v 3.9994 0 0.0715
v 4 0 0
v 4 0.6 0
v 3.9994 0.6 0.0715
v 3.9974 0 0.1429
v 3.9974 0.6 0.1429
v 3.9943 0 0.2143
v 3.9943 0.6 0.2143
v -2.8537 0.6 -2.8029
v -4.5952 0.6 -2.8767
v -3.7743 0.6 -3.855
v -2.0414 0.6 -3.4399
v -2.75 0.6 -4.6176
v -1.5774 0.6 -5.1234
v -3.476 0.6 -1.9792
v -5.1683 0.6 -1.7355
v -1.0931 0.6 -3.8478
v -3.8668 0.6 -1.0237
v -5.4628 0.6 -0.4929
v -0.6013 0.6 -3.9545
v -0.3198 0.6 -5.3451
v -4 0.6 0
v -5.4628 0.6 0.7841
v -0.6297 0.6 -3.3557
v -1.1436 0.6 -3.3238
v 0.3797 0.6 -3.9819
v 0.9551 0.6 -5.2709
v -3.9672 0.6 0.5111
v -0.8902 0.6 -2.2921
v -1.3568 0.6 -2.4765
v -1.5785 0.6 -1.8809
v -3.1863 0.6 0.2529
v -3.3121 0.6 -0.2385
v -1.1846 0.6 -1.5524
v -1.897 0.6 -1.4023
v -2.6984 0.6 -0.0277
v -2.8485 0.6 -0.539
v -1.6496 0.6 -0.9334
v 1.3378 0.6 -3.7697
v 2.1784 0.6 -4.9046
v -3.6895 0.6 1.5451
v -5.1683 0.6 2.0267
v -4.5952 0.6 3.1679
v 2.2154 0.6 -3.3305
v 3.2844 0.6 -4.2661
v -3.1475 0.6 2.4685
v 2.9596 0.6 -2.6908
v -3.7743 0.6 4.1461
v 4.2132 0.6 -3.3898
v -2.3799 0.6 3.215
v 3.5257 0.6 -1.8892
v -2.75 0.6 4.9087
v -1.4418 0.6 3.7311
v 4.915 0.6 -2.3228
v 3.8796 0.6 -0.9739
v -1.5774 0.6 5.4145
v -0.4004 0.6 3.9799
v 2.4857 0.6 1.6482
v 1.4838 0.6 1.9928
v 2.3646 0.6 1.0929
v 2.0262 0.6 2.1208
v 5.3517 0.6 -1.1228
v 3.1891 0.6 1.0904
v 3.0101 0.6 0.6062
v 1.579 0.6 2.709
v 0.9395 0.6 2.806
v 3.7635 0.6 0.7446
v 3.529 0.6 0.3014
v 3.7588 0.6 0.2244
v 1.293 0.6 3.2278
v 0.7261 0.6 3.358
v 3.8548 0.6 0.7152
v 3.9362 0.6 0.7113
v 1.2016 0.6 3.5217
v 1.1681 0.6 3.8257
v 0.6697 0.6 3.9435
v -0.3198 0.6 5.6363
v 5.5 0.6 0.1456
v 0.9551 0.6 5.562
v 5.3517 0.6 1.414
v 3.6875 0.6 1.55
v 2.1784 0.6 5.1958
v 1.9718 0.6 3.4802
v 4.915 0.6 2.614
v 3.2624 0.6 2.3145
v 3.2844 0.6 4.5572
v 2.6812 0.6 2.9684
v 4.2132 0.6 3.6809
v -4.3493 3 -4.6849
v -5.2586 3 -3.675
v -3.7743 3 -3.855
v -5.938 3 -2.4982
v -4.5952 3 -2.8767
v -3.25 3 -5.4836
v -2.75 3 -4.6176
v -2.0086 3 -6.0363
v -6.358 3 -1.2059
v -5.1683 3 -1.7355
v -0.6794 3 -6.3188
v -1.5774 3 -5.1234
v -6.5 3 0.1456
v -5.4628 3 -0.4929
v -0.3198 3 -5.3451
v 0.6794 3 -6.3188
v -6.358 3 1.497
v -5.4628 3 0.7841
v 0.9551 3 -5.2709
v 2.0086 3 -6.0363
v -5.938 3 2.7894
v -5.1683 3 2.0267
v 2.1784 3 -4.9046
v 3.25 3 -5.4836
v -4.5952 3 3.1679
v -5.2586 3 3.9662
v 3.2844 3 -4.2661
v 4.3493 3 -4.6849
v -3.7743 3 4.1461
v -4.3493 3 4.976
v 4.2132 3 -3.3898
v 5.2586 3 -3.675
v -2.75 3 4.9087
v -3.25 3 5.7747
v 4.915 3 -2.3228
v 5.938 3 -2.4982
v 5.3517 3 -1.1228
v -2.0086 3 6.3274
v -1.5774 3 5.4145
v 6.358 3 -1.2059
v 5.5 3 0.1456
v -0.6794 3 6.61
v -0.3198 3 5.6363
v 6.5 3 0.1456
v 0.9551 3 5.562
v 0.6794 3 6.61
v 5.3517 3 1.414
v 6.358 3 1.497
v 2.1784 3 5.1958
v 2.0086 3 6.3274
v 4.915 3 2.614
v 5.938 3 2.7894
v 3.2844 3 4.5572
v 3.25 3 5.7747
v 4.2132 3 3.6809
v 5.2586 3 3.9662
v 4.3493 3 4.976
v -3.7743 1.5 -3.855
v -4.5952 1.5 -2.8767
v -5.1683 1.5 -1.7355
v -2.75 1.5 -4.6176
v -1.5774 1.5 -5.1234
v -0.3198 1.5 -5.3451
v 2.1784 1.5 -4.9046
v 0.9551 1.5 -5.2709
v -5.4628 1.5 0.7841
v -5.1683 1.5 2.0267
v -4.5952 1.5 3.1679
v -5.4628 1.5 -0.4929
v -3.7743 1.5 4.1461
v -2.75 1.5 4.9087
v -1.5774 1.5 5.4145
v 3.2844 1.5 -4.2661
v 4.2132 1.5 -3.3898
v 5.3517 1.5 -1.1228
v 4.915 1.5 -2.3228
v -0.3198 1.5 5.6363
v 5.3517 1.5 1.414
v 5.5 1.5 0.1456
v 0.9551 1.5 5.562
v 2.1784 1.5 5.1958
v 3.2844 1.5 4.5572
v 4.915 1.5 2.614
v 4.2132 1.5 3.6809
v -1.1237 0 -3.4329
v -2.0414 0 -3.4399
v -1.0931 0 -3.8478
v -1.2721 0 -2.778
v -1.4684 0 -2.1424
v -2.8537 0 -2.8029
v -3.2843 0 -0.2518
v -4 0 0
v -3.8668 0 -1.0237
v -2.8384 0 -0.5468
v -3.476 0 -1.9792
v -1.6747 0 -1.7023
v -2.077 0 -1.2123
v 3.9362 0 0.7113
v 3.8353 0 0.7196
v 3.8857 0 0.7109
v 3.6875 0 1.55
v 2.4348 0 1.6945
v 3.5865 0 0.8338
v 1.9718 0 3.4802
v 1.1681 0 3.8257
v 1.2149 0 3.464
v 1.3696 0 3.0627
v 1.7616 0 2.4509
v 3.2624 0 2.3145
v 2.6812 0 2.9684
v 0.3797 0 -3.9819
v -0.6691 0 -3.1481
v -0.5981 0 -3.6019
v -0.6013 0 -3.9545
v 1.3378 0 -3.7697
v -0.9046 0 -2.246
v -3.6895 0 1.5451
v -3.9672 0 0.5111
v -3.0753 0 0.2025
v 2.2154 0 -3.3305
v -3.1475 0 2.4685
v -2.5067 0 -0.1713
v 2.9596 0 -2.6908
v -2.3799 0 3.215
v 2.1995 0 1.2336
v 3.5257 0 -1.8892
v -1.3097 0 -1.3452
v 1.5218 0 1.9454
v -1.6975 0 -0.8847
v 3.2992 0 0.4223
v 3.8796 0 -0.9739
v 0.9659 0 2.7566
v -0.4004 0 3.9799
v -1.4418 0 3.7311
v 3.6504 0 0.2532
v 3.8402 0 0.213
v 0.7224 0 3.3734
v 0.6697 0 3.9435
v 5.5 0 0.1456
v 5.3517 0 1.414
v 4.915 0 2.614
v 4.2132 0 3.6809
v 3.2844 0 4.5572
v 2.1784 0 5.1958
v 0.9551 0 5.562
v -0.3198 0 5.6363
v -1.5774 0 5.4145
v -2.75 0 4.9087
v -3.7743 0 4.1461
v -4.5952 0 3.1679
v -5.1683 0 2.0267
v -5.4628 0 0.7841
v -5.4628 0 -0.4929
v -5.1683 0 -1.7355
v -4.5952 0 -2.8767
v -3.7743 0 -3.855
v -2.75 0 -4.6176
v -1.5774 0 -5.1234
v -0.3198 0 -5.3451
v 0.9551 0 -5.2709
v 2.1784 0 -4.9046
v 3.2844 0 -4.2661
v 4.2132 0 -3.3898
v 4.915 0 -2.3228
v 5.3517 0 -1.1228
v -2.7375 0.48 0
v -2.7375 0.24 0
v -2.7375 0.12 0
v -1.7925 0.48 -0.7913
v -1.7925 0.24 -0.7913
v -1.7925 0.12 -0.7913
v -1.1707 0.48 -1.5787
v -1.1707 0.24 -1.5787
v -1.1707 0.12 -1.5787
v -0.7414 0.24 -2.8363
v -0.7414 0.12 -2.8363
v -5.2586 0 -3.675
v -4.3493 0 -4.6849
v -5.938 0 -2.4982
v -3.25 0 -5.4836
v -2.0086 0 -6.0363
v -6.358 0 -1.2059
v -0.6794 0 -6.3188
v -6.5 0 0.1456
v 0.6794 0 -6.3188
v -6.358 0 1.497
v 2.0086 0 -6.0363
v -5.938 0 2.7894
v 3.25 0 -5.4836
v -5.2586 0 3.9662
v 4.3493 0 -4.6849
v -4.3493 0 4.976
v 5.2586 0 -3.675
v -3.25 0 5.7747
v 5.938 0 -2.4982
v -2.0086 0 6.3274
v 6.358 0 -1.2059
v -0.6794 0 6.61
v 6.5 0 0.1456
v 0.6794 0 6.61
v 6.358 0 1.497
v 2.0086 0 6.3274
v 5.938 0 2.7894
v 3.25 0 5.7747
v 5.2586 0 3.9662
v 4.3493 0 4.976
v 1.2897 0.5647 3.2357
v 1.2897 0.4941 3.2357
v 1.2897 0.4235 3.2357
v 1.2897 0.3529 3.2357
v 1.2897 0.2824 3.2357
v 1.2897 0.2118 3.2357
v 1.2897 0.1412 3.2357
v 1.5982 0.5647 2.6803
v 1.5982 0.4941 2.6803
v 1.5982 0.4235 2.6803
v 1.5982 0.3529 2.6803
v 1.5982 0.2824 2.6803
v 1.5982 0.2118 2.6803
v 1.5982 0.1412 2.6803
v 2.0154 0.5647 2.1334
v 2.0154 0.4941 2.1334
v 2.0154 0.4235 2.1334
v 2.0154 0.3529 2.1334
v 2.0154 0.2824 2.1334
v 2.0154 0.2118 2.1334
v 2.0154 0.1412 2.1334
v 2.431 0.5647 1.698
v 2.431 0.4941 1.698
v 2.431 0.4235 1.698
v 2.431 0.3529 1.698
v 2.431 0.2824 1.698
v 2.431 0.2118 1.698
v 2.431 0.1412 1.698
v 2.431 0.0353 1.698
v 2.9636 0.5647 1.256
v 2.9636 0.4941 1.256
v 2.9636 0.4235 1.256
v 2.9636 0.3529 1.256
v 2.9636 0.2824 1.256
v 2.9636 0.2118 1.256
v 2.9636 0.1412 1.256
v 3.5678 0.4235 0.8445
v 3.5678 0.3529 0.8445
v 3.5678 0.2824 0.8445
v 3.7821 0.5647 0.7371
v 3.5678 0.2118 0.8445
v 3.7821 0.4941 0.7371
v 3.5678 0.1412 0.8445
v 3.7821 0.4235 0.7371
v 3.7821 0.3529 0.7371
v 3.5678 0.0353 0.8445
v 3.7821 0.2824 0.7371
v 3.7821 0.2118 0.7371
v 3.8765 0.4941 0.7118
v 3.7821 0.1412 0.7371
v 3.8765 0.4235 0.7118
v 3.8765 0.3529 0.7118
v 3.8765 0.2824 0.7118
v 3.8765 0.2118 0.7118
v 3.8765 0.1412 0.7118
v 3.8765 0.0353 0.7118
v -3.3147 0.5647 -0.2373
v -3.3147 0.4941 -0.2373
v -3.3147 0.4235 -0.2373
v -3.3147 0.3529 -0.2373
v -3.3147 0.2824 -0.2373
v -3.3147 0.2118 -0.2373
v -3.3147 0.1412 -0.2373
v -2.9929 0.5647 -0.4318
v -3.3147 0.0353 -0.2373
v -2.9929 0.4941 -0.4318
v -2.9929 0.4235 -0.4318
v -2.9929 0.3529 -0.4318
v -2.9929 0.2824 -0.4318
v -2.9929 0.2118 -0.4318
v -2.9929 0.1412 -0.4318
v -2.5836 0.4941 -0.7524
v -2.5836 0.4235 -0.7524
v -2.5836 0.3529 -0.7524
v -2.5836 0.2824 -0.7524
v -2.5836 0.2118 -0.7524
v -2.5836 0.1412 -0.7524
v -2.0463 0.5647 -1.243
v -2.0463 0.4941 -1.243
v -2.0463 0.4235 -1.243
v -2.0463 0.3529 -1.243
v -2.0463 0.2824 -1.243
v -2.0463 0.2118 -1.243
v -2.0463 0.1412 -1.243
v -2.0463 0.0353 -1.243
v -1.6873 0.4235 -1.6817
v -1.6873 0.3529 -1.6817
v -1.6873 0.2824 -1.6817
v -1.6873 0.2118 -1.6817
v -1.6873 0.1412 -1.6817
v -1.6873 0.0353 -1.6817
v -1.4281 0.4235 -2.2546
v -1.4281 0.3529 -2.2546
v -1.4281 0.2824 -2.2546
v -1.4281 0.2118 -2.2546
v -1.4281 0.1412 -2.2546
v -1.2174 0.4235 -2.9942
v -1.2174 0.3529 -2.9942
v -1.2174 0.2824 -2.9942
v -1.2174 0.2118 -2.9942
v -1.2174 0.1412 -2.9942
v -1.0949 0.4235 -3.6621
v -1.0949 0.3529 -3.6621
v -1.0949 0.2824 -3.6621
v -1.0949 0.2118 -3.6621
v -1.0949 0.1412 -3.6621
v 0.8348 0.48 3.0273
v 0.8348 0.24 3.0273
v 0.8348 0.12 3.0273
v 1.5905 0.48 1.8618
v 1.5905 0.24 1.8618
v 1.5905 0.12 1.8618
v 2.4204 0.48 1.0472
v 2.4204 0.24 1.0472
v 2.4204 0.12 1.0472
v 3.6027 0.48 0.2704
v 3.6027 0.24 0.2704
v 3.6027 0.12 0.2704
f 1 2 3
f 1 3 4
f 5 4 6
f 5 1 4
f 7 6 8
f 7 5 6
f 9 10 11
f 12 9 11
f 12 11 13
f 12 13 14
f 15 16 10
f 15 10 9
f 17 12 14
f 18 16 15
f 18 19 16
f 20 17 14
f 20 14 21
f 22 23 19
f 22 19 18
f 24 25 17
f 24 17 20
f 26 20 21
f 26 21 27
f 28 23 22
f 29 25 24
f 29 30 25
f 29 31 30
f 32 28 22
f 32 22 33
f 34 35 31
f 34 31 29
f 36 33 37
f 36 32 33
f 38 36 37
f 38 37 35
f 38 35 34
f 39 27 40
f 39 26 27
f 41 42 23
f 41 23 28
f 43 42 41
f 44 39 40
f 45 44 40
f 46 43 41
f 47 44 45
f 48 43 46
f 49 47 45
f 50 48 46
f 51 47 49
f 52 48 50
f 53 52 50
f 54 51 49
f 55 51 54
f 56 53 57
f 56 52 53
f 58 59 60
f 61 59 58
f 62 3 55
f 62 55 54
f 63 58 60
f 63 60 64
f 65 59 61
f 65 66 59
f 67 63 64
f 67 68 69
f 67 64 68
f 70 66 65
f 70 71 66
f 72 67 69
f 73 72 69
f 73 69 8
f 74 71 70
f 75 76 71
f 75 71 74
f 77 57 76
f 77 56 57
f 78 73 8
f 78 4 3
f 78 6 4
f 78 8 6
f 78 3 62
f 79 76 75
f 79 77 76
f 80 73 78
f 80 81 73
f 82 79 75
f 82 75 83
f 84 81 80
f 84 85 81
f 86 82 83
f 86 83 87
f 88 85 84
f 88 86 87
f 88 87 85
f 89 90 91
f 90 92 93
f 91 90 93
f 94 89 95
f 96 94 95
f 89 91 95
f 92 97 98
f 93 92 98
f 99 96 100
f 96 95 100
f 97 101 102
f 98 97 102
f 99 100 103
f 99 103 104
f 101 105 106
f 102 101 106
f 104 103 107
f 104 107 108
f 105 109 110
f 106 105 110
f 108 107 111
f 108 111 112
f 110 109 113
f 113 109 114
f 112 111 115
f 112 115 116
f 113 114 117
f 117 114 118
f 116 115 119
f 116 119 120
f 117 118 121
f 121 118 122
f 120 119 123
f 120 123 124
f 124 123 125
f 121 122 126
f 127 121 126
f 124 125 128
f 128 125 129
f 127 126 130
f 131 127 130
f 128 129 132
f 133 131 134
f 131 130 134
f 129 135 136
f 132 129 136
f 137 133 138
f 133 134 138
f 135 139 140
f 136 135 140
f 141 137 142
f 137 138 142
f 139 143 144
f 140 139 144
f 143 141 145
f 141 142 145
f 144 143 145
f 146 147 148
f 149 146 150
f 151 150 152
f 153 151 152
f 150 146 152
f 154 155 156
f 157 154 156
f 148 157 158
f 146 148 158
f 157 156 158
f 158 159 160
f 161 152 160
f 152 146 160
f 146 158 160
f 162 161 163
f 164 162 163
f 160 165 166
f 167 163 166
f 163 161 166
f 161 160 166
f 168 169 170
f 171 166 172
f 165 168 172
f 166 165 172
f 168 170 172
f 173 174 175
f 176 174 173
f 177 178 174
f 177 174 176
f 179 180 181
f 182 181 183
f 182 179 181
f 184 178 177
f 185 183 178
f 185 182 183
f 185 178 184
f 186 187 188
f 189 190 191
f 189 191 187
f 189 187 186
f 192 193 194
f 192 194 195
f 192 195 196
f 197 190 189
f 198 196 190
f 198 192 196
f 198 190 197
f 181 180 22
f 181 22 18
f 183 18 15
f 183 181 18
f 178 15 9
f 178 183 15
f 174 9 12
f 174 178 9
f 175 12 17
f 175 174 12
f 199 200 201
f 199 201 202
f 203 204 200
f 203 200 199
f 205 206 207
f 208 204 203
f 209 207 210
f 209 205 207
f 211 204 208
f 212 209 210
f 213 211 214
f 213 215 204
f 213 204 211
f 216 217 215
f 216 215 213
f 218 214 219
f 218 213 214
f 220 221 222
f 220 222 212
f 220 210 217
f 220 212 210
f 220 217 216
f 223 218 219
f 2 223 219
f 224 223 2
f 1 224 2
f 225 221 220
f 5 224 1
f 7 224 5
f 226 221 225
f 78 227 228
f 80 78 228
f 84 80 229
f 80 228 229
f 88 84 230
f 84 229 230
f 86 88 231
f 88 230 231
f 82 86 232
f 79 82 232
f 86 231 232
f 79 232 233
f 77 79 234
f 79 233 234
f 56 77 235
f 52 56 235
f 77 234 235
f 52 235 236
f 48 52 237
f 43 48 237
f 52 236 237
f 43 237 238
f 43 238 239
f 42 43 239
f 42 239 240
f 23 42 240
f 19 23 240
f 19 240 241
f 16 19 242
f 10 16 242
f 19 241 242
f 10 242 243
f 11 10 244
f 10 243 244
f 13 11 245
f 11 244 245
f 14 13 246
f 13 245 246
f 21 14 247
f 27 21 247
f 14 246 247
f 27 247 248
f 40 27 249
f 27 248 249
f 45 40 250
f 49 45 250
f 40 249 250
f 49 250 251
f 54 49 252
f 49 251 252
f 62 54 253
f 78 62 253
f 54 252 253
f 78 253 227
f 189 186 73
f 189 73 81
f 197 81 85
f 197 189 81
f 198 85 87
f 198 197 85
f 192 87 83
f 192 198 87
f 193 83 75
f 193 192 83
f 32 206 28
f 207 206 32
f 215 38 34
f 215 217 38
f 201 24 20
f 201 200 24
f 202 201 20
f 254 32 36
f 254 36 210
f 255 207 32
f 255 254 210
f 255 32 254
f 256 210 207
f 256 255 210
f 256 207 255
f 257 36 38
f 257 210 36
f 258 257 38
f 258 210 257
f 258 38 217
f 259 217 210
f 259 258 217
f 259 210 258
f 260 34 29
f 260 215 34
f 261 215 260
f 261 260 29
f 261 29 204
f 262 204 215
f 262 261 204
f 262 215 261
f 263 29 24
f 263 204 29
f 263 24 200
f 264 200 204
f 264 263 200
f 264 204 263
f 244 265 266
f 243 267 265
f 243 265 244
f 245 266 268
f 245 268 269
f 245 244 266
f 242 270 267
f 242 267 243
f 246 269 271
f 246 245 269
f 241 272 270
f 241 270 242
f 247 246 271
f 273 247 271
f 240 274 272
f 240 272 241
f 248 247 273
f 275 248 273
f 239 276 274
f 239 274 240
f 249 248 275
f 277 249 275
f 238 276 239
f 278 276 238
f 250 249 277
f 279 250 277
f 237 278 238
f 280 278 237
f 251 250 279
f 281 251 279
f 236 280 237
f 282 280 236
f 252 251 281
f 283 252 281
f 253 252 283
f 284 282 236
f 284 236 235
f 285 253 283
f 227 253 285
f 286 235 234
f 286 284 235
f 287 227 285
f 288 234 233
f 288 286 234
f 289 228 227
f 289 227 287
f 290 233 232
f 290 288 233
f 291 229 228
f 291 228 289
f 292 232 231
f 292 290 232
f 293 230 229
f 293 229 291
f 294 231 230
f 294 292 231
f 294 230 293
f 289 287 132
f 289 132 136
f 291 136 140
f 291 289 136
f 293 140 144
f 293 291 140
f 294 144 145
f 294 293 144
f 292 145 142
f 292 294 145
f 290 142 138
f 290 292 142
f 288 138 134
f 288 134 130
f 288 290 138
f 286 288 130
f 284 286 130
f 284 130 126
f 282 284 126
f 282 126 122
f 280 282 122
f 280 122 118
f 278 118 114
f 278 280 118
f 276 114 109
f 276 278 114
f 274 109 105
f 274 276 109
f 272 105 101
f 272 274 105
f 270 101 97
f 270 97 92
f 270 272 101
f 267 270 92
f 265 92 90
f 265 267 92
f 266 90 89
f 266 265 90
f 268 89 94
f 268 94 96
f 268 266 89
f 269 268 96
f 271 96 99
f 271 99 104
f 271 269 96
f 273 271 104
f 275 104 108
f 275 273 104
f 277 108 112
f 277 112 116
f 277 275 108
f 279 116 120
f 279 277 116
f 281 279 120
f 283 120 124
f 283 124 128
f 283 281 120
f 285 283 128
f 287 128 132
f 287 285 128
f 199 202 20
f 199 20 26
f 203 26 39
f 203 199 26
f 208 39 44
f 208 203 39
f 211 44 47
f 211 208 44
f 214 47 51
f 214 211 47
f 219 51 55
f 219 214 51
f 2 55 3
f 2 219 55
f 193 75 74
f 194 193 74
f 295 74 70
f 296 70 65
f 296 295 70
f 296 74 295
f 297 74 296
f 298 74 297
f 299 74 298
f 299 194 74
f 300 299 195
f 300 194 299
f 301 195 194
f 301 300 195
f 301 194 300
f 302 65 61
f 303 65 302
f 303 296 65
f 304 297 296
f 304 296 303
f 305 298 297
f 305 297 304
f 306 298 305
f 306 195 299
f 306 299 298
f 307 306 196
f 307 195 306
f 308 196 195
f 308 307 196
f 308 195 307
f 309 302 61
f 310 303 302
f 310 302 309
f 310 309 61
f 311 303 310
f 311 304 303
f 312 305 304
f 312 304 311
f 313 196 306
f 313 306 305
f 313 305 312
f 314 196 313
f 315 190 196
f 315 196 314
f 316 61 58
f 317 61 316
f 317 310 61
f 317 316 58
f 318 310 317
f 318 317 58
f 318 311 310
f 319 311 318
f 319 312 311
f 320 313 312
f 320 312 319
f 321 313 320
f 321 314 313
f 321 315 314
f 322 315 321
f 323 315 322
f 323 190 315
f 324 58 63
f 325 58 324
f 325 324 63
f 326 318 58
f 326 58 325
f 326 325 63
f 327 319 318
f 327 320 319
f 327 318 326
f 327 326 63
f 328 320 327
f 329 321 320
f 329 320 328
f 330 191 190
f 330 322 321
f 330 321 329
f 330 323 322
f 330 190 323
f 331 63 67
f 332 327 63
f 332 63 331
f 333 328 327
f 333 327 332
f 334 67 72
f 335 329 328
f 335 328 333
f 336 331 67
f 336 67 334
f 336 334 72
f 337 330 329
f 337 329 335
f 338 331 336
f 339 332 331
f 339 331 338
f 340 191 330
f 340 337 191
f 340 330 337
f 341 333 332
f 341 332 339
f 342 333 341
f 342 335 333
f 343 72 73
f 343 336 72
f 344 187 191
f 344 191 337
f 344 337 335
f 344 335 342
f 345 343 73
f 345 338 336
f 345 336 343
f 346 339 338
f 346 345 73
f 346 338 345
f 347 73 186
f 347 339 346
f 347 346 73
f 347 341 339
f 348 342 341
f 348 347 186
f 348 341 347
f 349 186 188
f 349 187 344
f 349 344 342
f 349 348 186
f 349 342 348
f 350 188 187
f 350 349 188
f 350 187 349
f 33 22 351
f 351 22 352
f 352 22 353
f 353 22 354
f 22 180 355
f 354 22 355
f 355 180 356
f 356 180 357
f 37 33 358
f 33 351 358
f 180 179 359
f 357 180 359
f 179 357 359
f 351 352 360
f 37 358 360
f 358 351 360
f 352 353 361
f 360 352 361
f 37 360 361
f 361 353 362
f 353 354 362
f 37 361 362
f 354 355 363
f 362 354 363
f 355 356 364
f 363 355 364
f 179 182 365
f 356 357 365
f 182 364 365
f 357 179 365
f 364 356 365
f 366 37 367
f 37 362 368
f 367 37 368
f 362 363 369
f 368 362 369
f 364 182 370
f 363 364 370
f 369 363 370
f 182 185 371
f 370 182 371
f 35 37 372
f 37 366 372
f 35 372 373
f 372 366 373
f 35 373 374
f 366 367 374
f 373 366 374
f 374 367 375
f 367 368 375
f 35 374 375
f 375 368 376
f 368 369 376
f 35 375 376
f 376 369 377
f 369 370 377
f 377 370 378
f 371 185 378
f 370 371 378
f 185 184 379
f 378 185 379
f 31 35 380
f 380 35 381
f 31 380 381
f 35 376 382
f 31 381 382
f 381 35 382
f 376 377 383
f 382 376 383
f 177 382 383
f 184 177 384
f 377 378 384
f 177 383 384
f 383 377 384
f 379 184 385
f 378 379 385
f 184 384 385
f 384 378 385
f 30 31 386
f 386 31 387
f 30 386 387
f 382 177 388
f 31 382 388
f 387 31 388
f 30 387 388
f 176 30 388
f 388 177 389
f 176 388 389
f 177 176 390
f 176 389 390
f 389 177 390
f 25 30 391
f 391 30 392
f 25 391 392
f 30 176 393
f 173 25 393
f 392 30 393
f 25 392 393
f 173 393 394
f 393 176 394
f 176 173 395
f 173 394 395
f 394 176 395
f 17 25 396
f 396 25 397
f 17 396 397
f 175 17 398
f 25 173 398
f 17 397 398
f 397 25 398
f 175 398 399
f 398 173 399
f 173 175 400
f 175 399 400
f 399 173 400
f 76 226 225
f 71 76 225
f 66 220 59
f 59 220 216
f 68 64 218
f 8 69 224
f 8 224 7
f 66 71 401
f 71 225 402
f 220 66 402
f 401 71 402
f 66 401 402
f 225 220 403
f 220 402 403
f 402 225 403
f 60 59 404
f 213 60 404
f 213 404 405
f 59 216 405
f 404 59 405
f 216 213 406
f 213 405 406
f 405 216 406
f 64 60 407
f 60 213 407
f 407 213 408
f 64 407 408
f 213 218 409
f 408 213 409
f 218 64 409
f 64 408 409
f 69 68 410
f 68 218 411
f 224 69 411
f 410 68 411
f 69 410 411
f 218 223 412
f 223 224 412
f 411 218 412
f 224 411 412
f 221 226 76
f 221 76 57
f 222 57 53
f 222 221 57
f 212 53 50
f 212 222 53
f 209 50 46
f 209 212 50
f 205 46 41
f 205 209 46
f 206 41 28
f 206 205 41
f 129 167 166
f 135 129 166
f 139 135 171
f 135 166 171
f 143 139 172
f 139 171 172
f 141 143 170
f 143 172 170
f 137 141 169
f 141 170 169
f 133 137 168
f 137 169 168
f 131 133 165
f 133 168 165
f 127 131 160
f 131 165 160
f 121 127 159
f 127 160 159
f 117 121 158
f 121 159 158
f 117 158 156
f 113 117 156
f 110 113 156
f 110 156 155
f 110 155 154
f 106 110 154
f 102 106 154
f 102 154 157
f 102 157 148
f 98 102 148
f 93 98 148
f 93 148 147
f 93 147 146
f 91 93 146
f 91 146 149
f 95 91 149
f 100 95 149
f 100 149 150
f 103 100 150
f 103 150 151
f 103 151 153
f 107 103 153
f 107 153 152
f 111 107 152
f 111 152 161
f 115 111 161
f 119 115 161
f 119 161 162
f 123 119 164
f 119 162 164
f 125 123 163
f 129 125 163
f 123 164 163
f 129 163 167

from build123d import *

# Parameters (mm, degrees)
F1_R     = 6.5
F1_R_2   = 5.5
F3_DEPTH = 3
F4_DEPTH = 1.5
F5_DEPTH = 0.6
F6_DEPTH = 1
F7_DEPTH = 1
F8_DEPTH = 1


# Not quite as in the source:
# - ends of sketch curves that miss each other by under 0.0002 mm in the source are joined
# - the dataset's text gives a spline's control points without its knots; the knots are read off the source's solid


with BuildPart() as f3:
    # F1 (on Front) → F3 (new body)
    with BuildSketch(Plane.XZ):
        with Locations((1.996e-07, 0.145563783)):
            Circle(F1_R)
        with Locations((1.996e-07, 0.145563783)):
            Circle(F1_R_2, mode=Mode.SUBTRACT)
    extrude(amount=-F3_DEPTH)

    # F0 (on Front) + F1 (on Front) → F4 (join)
    with BuildSketch(Plane.XZ):
        with BuildLine():
            add(Edge.make_bspline(
                [(-1.4633628161, -3.8408698747), (-0.8618942381, -4.0797628795), (1.7775925035, -4.2725148883), (2.1266039699, -2.4883414841), (2.1792066492, -0.8570773415), (2.1261946367, 0.7652860278), (1.8591945487, 1.4152828688), (2.1073079889, 1.4090746613), (2.1070261206, 1.5973545621), (1.8482611221, 1.6571502022), (1.9106924097, 2.0013449435), (1.883292753, 2.4559971082), (1.4530608962, 2.5796008165), (1.3486705812, 2.982608362), (0.9522813685, 3.1051443516), (0.6376593936, 3.1670181532), (0.4331394013, 3.4063180529), (0.6426984155, 3.8176132891), (0.3981993423, 4.2634916825), (-0.0062082347, 4.3047771669), (-0.3006353253, 4.2313929361), (-0.6271454426, 3.9609581822), (-0.5601436399, 3.6082200906), (-0.4158755178, 3.3585569408), (-0.6804152796, 3.1141950016), (-1.0068060059, 3.1249120402), (-1.1963426018, 2.8920399235), (-1.3913162215, 2.8683333491), (-1.3804892819, 2.6236576239), (-1.7077578499, 2.7520009173), (-1.8276300328, 2.3206081403), (-1.8540486856, 2.0110635487), (-1.8641412125, 1.6986764558), (-2.1169141262, 1.6232767981), (-2.0818952059, 1.4062115725), (-1.9001690611, 1.4703026422), (-2.1146422172, 0.8809803752), (-2.0979861646, 0.2234423606), (-2.2011740498, -0.523800053), (-2.1724225003, -1.2230030424), (-2.1779022447, -2.5473945892), (-1.9120269544, -3.4285716282), (-1.7403824301, -3.7308424346), (-1.4633628161, -3.8408698747)],
                knots=[0, 0, 0, 0, 0.0614284178, 0.105210304, 0.1528188952, 0.1998934744, 0.2260159491, 0.2394622475, 0.2521789794, 0.2685961982, 0.2887254165, 0.3121716538, 0.3345624104, 0.3566054098, 0.3791085644, 0.3997521347, 0.4178904262, 0.4412373911, 0.4652934844, 0.487296569, 0.5074239254, 0.5296841222, 0.5504706917, 0.5687295132, 0.5882529988, 0.6087082105, 0.6278548545, 0.642595893, 0.6569229468, 0.674176944, 0.6961346625, 0.7176137944, 0.736576695, 0.7535032789, 0.767308469, 0.7778501968, 0.8029343179, 0.8341377518, 0.8649078271, 0.8956216456, 0.9374997946, 0.9717077879, 1, 1, 1, 1], degree=3))
        make_face()
    with BuildSketch(Plane.XZ):
        with Locations((1.996e-07, 0.145563783)):
            Circle(F1_R_2)
    extrude(amount=-F4_DEPTH)

    # F1 (on Front) + F0 (on Front) → F5 (cut)
    with BuildSketch(Plane.XZ):
        with Locations((1.996e-07, 0.145563783)):
            Circle(F1_R_2)
    with BuildSketch(Plane.XZ):
        with BuildLine():
            add(Edge.make_bspline(
                [(-1.4633628161, -3.8408698747), (-0.8618942381, -4.0797628795), (1.7775925035, -4.2725148883), (2.1266039699, -2.4883414841), (2.1792066492, -0.8570773415), (2.1261946367, 0.7652860278), (1.8591945487, 1.4152828688), (2.1073079889, 1.4090746613), (2.1070261206, 1.5973545621), (1.8482611221, 1.6571502022), (1.9106924097, 2.0013449435), (1.883292753, 2.4559971082), (1.4530608962, 2.5796008165), (1.3486705812, 2.982608362), (0.9522813685, 3.1051443516), (0.6376593936, 3.1670181532), (0.4331394013, 3.4063180529), (0.6426984155, 3.8176132891), (0.3981993423, 4.2634916825), (-0.0062082347, 4.3047771669), (-0.3006353253, 4.2313929361), (-0.6271454426, 3.9609581822), (-0.5601436399, 3.6082200906), (-0.4158755178, 3.3585569408), (-0.6804152796, 3.1141950016), (-1.0068060059, 3.1249120402), (-1.1963426018, 2.8920399235), (-1.3913162215, 2.8683333491), (-1.3804892819, 2.6236576239), (-1.7077578499, 2.7520009173), (-1.8276300328, 2.3206081403), (-1.8540486856, 2.0110635487), (-1.8641412125, 1.6986764558), (-2.1169141262, 1.6232767981), (-2.0818952059, 1.4062115725), (-1.9001690611, 1.4703026422), (-2.1146422172, 0.8809803752), (-2.0979861646, 0.2234423606), (-2.2011740498, -0.523800053), (-2.1724225003, -1.2230030424), (-2.1779022447, -2.5473945892), (-1.9120269544, -3.4285716282), (-1.7403824301, -3.7308424346), (-1.4633628161, -3.8408698747)],
                knots=[0, 0, 0, 0, 0.0614284178, 0.105210304, 0.1528188952, 0.1998934744, 0.2260159491, 0.2394622475, 0.2521789794, 0.2685961982, 0.2887254165, 0.3121716538, 0.3345624104, 0.3566054098, 0.3791085644, 0.3997521347, 0.4178904262, 0.4412373911, 0.4652934844, 0.487296569, 0.5074239254, 0.5296841222, 0.5504706917, 0.5687295132, 0.5882529988, 0.6087082105, 0.6278548545, 0.642595893, 0.6569229468, 0.674176944, 0.6961346625, 0.7176137944, 0.736576695, 0.7535032789, 0.767308469, 0.7778501968, 0.8029343179, 0.8341377518, 0.8649078271, 0.8956216456, 0.9374997946, 0.9717077879, 1, 1, 1, 1], degree=3))
        make_face()
    extrude(amount=-F5_DEPTH, mode=Mode.SUBTRACT)

    # F2 (on face) → F6 (join)
    with BuildSketch(Plane.XZ):
        with BuildLine():
            ThreePointArc((-0.6012813019, -3.9545493796), (2.6071895589, -3.0335725809), (4, 0))
            ThreePointArc((4, 0), (3.9985637458, 0.1071819529), (3.9942560145, 0.2142869356))
            add(Edge.make_bspline(
                [(0.6696937898, 3.9435403165), (0.6582621326, 3.6561648877), (0.748660393, 2.9819733395), (1.5906344476, 1.8060597163), (2.343729672, 1.0651587443), (3.5468225291, 0.2060757034), (3.8886131662, 0.2055288721), (3.9942560145, 0.2142869356)],
                knots=[0, 0, 0, 0, 0.1914441273, 0.4252731611, 0.6392341909, 0.8752207587, 1, 1, 1, 1], degree=3))
            ThreePointArc((0.6696937898, 3.9435403165), (-2.3798948862, 3.2149806112), (-3.9672180841, 0.5110583855))
            add(Edge.make_bspline(
                [(-3.9672180841, 0.5110583855), (-3.2570424953, 0.3072051337), (-2.8281277347, 0.1183736874), (-1.7521563519, -0.7910134795), (-1.1021707585, -1.5327189765), (-0.7270922455, -2.8181587186), (-0.5608016797, -3.6356710711), (-0.6012813019, -3.9545493796)],
                knots=[0, 0, 0, 0, 0.2105751714, 0.4131601255, 0.5959388752, 0.8062823722, 1, 1, 1, 1], degree=3))
        make_face()
    extrude(amount=-F6_DEPTH)

    # F2 (on face) → F7 (join)
    with BuildSketch(Plane.XZ):
        with BuildLine():
            ThreePointArc((-4, -5.4666e-06), (-3.1915709466, -2.4111978128), (-1.0930678122, -3.8477529492))
            add(Edge.make_bspline(
                [(-4, -5.4666e-06), (-3.8428166733, -0.0460123585), (-3.5603914777, -0.133738653), (-3.2985794295, -0.2386569495), (-3.1472677408, -0.3246867621), (-2.9956539452, -0.4287257802), (-2.8222463482, -0.557104318), (-2.5840878529, -0.7485534177), (-2.2954985412, -1.0016010876), (-2.036026908, -1.2482860637), (-1.8381629968, -1.4634144564), (-1.6835113586, -1.6757370022), (-1.5516009911, -1.9240469669), (-1.4256566149, -2.248184411), (-1.3146225307, -2.6109466281), (-1.2146554645, -2.9978949757), (-1.1313238625, -3.3629451013), (-1.0901758206, -3.651388342), (-1.0894246902, -3.7951254649), (-1.0930678122, -3.8477529492)],
                knots=[0.0110273175, 0.0110273175, 0.0110273175, 0.0110273175, 0.0625, 0.125, 0.1875, 0.21875, 0.25, 0.3125, 0.375, 0.4375, 0.5, 0.5625, 0.625, 0.6875, 0.75, 0.8125, 0.875, 0.9375, 0.9857876166, 0.9857876166, 0.9857876166, 0.9857876166], degree=3))
        make_face()
    extrude(amount=-F7_DEPTH)

    # F2 (on face) → F8 (join)
    with BuildSketch(Plane.XZ):
        with BuildLine():
            add(Edge.make_bspline(
                [(1.1680500995, 3.8256503793), (1.1697995693, 3.7107206965), (1.1918189199, 3.5214057887), (1.2802032379, 3.2411969251), (1.4118748463, 2.9720045965), (1.5937127908, 2.679461535), (1.8023614597, 2.3919954972), (2.0179930746, 2.1262894096), (2.2181018419, 1.9032227167), (2.4259640622, 1.6986298437), (2.6643415193, 1.4905337309), (2.9597106264, 1.2554890784), (3.2786287368, 1.0236228812), (3.5292013722, 0.8637020638), (3.6951311872, 0.7741756792), (3.7886457426, 0.7328710188), (3.8426743367, 0.7168415355), (3.8851876888, 0.7098421735), (3.9097876849, 0.7094994811), (3.9362444503, 0.7113026549)],
                knots=[0.0276671484, 0.0276671484, 0.0276671484, 0.0276671484, 0.125, 0.1875, 0.25, 0.3125, 0.375, 0.4375, 0.5, 0.5625, 0.625, 0.6875, 0.75, 0.8125, 0.84375, 0.875, 0.90625, 0.9375, 0.9898649034, 0.9898649034, 0.9898649034, 0.9898649034], degree=3))
            ThreePointArc((3.9362444503, 0.7113026549), (2.989694007, 2.6573915302), (1.1680500995, 3.8256503793))
        make_face()
    extrude(amount=-F8_DEPTH)


solid = f3.part
